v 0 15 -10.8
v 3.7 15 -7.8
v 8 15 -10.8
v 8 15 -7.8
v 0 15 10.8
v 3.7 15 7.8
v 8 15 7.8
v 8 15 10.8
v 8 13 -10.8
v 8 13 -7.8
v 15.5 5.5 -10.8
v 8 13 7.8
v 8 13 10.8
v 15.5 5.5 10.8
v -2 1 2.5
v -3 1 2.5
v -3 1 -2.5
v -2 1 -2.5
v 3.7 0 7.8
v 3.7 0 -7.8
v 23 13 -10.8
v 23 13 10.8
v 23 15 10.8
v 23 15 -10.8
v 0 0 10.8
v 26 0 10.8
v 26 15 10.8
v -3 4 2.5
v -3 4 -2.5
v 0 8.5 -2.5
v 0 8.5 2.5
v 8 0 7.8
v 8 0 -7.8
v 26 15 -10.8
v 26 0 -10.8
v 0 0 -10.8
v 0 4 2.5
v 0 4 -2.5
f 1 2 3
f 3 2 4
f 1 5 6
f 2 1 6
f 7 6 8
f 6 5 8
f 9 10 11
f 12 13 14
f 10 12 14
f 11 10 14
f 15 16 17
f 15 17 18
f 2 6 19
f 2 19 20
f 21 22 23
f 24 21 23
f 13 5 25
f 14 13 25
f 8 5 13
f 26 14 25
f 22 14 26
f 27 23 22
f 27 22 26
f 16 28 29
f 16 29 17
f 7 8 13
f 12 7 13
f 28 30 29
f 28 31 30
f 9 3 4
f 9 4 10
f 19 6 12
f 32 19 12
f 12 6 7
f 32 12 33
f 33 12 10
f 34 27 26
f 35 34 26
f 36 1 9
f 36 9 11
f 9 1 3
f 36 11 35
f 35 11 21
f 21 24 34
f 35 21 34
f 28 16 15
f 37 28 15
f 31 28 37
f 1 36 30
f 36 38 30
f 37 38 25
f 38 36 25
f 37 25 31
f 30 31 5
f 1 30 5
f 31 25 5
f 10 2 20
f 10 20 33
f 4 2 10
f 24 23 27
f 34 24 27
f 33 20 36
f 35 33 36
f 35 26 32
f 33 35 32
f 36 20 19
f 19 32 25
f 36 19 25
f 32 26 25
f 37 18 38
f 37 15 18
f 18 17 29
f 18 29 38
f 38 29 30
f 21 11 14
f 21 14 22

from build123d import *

# Parameters (mm, degrees)
RESSALTO_EXTRUS_O1_DEPTH   = 25
ESBO_O5_W                  = 4.3
ESBO_O5_H                  = 15.6
ESBO_O5_W_2                = 26
ESBO_O5_H_2                = 14.2
CORTE_EXTRUS_O4_DEPTH      = 1
CORTE_EXTRUS_O4_DEPTH_BACK = 16
RESSALTO_EXTRUS_O2_DEPTH   = 2.5


with BuildPart() as part:
    # Esboço1 → Ressalto-extrusão1 (new body, symmetric)
    with BuildSketch(Plane.XY):
        Polygon((26, 0), (0, 0), (0, 15), (8, 15), (8, 13), (15.5, 5.5), (23, 13), (23, 15), (26, 15), align=None)
    extrude(amount=RESSALTO_EXTRUS_O1_DEPTH, both=True)

    # Esboço5 → Corte-extrusão4 (cut, two sides)
    with BuildSketch(Plane(origin=(0, 15, 0), x_dir=(1, 0, 0), z_dir=(0, 1, 0))) as corte_extrus_o4_sk:
        with Locations((5.85, 0)):
            Rectangle(ESBO_O5_W, ESBO_O5_H)
        with Locations((13, 17.9)):
            Rectangle(ESBO_O5_W_2, ESBO_O5_H_2)
        with Locations((13, -17.9)):
            Rectangle(ESBO_O5_W_2, ESBO_O5_H_2)
    extrude(amount=CORTE_EXTRUS_O4_DEPTH, mode=Mode.SUBTRACT)
    extrude(corte_extrus_o4_sk.sketch, amount=-CORTE_EXTRUS_O4_DEPTH_BACK, mode=Mode.SUBTRACT)

    # Esboço6 → Ressalto-extrusão2 (add, symmetric)
    with BuildSketch(Plane.XY):
        Polygon((0, 8.5), (-3, 4), (-3, 1), (-2, 1), (0, 4), align=None)
    extrude(amount=RESSALTO_EXTRUS_O2_DEPTH, both=True)


solid = part.part
